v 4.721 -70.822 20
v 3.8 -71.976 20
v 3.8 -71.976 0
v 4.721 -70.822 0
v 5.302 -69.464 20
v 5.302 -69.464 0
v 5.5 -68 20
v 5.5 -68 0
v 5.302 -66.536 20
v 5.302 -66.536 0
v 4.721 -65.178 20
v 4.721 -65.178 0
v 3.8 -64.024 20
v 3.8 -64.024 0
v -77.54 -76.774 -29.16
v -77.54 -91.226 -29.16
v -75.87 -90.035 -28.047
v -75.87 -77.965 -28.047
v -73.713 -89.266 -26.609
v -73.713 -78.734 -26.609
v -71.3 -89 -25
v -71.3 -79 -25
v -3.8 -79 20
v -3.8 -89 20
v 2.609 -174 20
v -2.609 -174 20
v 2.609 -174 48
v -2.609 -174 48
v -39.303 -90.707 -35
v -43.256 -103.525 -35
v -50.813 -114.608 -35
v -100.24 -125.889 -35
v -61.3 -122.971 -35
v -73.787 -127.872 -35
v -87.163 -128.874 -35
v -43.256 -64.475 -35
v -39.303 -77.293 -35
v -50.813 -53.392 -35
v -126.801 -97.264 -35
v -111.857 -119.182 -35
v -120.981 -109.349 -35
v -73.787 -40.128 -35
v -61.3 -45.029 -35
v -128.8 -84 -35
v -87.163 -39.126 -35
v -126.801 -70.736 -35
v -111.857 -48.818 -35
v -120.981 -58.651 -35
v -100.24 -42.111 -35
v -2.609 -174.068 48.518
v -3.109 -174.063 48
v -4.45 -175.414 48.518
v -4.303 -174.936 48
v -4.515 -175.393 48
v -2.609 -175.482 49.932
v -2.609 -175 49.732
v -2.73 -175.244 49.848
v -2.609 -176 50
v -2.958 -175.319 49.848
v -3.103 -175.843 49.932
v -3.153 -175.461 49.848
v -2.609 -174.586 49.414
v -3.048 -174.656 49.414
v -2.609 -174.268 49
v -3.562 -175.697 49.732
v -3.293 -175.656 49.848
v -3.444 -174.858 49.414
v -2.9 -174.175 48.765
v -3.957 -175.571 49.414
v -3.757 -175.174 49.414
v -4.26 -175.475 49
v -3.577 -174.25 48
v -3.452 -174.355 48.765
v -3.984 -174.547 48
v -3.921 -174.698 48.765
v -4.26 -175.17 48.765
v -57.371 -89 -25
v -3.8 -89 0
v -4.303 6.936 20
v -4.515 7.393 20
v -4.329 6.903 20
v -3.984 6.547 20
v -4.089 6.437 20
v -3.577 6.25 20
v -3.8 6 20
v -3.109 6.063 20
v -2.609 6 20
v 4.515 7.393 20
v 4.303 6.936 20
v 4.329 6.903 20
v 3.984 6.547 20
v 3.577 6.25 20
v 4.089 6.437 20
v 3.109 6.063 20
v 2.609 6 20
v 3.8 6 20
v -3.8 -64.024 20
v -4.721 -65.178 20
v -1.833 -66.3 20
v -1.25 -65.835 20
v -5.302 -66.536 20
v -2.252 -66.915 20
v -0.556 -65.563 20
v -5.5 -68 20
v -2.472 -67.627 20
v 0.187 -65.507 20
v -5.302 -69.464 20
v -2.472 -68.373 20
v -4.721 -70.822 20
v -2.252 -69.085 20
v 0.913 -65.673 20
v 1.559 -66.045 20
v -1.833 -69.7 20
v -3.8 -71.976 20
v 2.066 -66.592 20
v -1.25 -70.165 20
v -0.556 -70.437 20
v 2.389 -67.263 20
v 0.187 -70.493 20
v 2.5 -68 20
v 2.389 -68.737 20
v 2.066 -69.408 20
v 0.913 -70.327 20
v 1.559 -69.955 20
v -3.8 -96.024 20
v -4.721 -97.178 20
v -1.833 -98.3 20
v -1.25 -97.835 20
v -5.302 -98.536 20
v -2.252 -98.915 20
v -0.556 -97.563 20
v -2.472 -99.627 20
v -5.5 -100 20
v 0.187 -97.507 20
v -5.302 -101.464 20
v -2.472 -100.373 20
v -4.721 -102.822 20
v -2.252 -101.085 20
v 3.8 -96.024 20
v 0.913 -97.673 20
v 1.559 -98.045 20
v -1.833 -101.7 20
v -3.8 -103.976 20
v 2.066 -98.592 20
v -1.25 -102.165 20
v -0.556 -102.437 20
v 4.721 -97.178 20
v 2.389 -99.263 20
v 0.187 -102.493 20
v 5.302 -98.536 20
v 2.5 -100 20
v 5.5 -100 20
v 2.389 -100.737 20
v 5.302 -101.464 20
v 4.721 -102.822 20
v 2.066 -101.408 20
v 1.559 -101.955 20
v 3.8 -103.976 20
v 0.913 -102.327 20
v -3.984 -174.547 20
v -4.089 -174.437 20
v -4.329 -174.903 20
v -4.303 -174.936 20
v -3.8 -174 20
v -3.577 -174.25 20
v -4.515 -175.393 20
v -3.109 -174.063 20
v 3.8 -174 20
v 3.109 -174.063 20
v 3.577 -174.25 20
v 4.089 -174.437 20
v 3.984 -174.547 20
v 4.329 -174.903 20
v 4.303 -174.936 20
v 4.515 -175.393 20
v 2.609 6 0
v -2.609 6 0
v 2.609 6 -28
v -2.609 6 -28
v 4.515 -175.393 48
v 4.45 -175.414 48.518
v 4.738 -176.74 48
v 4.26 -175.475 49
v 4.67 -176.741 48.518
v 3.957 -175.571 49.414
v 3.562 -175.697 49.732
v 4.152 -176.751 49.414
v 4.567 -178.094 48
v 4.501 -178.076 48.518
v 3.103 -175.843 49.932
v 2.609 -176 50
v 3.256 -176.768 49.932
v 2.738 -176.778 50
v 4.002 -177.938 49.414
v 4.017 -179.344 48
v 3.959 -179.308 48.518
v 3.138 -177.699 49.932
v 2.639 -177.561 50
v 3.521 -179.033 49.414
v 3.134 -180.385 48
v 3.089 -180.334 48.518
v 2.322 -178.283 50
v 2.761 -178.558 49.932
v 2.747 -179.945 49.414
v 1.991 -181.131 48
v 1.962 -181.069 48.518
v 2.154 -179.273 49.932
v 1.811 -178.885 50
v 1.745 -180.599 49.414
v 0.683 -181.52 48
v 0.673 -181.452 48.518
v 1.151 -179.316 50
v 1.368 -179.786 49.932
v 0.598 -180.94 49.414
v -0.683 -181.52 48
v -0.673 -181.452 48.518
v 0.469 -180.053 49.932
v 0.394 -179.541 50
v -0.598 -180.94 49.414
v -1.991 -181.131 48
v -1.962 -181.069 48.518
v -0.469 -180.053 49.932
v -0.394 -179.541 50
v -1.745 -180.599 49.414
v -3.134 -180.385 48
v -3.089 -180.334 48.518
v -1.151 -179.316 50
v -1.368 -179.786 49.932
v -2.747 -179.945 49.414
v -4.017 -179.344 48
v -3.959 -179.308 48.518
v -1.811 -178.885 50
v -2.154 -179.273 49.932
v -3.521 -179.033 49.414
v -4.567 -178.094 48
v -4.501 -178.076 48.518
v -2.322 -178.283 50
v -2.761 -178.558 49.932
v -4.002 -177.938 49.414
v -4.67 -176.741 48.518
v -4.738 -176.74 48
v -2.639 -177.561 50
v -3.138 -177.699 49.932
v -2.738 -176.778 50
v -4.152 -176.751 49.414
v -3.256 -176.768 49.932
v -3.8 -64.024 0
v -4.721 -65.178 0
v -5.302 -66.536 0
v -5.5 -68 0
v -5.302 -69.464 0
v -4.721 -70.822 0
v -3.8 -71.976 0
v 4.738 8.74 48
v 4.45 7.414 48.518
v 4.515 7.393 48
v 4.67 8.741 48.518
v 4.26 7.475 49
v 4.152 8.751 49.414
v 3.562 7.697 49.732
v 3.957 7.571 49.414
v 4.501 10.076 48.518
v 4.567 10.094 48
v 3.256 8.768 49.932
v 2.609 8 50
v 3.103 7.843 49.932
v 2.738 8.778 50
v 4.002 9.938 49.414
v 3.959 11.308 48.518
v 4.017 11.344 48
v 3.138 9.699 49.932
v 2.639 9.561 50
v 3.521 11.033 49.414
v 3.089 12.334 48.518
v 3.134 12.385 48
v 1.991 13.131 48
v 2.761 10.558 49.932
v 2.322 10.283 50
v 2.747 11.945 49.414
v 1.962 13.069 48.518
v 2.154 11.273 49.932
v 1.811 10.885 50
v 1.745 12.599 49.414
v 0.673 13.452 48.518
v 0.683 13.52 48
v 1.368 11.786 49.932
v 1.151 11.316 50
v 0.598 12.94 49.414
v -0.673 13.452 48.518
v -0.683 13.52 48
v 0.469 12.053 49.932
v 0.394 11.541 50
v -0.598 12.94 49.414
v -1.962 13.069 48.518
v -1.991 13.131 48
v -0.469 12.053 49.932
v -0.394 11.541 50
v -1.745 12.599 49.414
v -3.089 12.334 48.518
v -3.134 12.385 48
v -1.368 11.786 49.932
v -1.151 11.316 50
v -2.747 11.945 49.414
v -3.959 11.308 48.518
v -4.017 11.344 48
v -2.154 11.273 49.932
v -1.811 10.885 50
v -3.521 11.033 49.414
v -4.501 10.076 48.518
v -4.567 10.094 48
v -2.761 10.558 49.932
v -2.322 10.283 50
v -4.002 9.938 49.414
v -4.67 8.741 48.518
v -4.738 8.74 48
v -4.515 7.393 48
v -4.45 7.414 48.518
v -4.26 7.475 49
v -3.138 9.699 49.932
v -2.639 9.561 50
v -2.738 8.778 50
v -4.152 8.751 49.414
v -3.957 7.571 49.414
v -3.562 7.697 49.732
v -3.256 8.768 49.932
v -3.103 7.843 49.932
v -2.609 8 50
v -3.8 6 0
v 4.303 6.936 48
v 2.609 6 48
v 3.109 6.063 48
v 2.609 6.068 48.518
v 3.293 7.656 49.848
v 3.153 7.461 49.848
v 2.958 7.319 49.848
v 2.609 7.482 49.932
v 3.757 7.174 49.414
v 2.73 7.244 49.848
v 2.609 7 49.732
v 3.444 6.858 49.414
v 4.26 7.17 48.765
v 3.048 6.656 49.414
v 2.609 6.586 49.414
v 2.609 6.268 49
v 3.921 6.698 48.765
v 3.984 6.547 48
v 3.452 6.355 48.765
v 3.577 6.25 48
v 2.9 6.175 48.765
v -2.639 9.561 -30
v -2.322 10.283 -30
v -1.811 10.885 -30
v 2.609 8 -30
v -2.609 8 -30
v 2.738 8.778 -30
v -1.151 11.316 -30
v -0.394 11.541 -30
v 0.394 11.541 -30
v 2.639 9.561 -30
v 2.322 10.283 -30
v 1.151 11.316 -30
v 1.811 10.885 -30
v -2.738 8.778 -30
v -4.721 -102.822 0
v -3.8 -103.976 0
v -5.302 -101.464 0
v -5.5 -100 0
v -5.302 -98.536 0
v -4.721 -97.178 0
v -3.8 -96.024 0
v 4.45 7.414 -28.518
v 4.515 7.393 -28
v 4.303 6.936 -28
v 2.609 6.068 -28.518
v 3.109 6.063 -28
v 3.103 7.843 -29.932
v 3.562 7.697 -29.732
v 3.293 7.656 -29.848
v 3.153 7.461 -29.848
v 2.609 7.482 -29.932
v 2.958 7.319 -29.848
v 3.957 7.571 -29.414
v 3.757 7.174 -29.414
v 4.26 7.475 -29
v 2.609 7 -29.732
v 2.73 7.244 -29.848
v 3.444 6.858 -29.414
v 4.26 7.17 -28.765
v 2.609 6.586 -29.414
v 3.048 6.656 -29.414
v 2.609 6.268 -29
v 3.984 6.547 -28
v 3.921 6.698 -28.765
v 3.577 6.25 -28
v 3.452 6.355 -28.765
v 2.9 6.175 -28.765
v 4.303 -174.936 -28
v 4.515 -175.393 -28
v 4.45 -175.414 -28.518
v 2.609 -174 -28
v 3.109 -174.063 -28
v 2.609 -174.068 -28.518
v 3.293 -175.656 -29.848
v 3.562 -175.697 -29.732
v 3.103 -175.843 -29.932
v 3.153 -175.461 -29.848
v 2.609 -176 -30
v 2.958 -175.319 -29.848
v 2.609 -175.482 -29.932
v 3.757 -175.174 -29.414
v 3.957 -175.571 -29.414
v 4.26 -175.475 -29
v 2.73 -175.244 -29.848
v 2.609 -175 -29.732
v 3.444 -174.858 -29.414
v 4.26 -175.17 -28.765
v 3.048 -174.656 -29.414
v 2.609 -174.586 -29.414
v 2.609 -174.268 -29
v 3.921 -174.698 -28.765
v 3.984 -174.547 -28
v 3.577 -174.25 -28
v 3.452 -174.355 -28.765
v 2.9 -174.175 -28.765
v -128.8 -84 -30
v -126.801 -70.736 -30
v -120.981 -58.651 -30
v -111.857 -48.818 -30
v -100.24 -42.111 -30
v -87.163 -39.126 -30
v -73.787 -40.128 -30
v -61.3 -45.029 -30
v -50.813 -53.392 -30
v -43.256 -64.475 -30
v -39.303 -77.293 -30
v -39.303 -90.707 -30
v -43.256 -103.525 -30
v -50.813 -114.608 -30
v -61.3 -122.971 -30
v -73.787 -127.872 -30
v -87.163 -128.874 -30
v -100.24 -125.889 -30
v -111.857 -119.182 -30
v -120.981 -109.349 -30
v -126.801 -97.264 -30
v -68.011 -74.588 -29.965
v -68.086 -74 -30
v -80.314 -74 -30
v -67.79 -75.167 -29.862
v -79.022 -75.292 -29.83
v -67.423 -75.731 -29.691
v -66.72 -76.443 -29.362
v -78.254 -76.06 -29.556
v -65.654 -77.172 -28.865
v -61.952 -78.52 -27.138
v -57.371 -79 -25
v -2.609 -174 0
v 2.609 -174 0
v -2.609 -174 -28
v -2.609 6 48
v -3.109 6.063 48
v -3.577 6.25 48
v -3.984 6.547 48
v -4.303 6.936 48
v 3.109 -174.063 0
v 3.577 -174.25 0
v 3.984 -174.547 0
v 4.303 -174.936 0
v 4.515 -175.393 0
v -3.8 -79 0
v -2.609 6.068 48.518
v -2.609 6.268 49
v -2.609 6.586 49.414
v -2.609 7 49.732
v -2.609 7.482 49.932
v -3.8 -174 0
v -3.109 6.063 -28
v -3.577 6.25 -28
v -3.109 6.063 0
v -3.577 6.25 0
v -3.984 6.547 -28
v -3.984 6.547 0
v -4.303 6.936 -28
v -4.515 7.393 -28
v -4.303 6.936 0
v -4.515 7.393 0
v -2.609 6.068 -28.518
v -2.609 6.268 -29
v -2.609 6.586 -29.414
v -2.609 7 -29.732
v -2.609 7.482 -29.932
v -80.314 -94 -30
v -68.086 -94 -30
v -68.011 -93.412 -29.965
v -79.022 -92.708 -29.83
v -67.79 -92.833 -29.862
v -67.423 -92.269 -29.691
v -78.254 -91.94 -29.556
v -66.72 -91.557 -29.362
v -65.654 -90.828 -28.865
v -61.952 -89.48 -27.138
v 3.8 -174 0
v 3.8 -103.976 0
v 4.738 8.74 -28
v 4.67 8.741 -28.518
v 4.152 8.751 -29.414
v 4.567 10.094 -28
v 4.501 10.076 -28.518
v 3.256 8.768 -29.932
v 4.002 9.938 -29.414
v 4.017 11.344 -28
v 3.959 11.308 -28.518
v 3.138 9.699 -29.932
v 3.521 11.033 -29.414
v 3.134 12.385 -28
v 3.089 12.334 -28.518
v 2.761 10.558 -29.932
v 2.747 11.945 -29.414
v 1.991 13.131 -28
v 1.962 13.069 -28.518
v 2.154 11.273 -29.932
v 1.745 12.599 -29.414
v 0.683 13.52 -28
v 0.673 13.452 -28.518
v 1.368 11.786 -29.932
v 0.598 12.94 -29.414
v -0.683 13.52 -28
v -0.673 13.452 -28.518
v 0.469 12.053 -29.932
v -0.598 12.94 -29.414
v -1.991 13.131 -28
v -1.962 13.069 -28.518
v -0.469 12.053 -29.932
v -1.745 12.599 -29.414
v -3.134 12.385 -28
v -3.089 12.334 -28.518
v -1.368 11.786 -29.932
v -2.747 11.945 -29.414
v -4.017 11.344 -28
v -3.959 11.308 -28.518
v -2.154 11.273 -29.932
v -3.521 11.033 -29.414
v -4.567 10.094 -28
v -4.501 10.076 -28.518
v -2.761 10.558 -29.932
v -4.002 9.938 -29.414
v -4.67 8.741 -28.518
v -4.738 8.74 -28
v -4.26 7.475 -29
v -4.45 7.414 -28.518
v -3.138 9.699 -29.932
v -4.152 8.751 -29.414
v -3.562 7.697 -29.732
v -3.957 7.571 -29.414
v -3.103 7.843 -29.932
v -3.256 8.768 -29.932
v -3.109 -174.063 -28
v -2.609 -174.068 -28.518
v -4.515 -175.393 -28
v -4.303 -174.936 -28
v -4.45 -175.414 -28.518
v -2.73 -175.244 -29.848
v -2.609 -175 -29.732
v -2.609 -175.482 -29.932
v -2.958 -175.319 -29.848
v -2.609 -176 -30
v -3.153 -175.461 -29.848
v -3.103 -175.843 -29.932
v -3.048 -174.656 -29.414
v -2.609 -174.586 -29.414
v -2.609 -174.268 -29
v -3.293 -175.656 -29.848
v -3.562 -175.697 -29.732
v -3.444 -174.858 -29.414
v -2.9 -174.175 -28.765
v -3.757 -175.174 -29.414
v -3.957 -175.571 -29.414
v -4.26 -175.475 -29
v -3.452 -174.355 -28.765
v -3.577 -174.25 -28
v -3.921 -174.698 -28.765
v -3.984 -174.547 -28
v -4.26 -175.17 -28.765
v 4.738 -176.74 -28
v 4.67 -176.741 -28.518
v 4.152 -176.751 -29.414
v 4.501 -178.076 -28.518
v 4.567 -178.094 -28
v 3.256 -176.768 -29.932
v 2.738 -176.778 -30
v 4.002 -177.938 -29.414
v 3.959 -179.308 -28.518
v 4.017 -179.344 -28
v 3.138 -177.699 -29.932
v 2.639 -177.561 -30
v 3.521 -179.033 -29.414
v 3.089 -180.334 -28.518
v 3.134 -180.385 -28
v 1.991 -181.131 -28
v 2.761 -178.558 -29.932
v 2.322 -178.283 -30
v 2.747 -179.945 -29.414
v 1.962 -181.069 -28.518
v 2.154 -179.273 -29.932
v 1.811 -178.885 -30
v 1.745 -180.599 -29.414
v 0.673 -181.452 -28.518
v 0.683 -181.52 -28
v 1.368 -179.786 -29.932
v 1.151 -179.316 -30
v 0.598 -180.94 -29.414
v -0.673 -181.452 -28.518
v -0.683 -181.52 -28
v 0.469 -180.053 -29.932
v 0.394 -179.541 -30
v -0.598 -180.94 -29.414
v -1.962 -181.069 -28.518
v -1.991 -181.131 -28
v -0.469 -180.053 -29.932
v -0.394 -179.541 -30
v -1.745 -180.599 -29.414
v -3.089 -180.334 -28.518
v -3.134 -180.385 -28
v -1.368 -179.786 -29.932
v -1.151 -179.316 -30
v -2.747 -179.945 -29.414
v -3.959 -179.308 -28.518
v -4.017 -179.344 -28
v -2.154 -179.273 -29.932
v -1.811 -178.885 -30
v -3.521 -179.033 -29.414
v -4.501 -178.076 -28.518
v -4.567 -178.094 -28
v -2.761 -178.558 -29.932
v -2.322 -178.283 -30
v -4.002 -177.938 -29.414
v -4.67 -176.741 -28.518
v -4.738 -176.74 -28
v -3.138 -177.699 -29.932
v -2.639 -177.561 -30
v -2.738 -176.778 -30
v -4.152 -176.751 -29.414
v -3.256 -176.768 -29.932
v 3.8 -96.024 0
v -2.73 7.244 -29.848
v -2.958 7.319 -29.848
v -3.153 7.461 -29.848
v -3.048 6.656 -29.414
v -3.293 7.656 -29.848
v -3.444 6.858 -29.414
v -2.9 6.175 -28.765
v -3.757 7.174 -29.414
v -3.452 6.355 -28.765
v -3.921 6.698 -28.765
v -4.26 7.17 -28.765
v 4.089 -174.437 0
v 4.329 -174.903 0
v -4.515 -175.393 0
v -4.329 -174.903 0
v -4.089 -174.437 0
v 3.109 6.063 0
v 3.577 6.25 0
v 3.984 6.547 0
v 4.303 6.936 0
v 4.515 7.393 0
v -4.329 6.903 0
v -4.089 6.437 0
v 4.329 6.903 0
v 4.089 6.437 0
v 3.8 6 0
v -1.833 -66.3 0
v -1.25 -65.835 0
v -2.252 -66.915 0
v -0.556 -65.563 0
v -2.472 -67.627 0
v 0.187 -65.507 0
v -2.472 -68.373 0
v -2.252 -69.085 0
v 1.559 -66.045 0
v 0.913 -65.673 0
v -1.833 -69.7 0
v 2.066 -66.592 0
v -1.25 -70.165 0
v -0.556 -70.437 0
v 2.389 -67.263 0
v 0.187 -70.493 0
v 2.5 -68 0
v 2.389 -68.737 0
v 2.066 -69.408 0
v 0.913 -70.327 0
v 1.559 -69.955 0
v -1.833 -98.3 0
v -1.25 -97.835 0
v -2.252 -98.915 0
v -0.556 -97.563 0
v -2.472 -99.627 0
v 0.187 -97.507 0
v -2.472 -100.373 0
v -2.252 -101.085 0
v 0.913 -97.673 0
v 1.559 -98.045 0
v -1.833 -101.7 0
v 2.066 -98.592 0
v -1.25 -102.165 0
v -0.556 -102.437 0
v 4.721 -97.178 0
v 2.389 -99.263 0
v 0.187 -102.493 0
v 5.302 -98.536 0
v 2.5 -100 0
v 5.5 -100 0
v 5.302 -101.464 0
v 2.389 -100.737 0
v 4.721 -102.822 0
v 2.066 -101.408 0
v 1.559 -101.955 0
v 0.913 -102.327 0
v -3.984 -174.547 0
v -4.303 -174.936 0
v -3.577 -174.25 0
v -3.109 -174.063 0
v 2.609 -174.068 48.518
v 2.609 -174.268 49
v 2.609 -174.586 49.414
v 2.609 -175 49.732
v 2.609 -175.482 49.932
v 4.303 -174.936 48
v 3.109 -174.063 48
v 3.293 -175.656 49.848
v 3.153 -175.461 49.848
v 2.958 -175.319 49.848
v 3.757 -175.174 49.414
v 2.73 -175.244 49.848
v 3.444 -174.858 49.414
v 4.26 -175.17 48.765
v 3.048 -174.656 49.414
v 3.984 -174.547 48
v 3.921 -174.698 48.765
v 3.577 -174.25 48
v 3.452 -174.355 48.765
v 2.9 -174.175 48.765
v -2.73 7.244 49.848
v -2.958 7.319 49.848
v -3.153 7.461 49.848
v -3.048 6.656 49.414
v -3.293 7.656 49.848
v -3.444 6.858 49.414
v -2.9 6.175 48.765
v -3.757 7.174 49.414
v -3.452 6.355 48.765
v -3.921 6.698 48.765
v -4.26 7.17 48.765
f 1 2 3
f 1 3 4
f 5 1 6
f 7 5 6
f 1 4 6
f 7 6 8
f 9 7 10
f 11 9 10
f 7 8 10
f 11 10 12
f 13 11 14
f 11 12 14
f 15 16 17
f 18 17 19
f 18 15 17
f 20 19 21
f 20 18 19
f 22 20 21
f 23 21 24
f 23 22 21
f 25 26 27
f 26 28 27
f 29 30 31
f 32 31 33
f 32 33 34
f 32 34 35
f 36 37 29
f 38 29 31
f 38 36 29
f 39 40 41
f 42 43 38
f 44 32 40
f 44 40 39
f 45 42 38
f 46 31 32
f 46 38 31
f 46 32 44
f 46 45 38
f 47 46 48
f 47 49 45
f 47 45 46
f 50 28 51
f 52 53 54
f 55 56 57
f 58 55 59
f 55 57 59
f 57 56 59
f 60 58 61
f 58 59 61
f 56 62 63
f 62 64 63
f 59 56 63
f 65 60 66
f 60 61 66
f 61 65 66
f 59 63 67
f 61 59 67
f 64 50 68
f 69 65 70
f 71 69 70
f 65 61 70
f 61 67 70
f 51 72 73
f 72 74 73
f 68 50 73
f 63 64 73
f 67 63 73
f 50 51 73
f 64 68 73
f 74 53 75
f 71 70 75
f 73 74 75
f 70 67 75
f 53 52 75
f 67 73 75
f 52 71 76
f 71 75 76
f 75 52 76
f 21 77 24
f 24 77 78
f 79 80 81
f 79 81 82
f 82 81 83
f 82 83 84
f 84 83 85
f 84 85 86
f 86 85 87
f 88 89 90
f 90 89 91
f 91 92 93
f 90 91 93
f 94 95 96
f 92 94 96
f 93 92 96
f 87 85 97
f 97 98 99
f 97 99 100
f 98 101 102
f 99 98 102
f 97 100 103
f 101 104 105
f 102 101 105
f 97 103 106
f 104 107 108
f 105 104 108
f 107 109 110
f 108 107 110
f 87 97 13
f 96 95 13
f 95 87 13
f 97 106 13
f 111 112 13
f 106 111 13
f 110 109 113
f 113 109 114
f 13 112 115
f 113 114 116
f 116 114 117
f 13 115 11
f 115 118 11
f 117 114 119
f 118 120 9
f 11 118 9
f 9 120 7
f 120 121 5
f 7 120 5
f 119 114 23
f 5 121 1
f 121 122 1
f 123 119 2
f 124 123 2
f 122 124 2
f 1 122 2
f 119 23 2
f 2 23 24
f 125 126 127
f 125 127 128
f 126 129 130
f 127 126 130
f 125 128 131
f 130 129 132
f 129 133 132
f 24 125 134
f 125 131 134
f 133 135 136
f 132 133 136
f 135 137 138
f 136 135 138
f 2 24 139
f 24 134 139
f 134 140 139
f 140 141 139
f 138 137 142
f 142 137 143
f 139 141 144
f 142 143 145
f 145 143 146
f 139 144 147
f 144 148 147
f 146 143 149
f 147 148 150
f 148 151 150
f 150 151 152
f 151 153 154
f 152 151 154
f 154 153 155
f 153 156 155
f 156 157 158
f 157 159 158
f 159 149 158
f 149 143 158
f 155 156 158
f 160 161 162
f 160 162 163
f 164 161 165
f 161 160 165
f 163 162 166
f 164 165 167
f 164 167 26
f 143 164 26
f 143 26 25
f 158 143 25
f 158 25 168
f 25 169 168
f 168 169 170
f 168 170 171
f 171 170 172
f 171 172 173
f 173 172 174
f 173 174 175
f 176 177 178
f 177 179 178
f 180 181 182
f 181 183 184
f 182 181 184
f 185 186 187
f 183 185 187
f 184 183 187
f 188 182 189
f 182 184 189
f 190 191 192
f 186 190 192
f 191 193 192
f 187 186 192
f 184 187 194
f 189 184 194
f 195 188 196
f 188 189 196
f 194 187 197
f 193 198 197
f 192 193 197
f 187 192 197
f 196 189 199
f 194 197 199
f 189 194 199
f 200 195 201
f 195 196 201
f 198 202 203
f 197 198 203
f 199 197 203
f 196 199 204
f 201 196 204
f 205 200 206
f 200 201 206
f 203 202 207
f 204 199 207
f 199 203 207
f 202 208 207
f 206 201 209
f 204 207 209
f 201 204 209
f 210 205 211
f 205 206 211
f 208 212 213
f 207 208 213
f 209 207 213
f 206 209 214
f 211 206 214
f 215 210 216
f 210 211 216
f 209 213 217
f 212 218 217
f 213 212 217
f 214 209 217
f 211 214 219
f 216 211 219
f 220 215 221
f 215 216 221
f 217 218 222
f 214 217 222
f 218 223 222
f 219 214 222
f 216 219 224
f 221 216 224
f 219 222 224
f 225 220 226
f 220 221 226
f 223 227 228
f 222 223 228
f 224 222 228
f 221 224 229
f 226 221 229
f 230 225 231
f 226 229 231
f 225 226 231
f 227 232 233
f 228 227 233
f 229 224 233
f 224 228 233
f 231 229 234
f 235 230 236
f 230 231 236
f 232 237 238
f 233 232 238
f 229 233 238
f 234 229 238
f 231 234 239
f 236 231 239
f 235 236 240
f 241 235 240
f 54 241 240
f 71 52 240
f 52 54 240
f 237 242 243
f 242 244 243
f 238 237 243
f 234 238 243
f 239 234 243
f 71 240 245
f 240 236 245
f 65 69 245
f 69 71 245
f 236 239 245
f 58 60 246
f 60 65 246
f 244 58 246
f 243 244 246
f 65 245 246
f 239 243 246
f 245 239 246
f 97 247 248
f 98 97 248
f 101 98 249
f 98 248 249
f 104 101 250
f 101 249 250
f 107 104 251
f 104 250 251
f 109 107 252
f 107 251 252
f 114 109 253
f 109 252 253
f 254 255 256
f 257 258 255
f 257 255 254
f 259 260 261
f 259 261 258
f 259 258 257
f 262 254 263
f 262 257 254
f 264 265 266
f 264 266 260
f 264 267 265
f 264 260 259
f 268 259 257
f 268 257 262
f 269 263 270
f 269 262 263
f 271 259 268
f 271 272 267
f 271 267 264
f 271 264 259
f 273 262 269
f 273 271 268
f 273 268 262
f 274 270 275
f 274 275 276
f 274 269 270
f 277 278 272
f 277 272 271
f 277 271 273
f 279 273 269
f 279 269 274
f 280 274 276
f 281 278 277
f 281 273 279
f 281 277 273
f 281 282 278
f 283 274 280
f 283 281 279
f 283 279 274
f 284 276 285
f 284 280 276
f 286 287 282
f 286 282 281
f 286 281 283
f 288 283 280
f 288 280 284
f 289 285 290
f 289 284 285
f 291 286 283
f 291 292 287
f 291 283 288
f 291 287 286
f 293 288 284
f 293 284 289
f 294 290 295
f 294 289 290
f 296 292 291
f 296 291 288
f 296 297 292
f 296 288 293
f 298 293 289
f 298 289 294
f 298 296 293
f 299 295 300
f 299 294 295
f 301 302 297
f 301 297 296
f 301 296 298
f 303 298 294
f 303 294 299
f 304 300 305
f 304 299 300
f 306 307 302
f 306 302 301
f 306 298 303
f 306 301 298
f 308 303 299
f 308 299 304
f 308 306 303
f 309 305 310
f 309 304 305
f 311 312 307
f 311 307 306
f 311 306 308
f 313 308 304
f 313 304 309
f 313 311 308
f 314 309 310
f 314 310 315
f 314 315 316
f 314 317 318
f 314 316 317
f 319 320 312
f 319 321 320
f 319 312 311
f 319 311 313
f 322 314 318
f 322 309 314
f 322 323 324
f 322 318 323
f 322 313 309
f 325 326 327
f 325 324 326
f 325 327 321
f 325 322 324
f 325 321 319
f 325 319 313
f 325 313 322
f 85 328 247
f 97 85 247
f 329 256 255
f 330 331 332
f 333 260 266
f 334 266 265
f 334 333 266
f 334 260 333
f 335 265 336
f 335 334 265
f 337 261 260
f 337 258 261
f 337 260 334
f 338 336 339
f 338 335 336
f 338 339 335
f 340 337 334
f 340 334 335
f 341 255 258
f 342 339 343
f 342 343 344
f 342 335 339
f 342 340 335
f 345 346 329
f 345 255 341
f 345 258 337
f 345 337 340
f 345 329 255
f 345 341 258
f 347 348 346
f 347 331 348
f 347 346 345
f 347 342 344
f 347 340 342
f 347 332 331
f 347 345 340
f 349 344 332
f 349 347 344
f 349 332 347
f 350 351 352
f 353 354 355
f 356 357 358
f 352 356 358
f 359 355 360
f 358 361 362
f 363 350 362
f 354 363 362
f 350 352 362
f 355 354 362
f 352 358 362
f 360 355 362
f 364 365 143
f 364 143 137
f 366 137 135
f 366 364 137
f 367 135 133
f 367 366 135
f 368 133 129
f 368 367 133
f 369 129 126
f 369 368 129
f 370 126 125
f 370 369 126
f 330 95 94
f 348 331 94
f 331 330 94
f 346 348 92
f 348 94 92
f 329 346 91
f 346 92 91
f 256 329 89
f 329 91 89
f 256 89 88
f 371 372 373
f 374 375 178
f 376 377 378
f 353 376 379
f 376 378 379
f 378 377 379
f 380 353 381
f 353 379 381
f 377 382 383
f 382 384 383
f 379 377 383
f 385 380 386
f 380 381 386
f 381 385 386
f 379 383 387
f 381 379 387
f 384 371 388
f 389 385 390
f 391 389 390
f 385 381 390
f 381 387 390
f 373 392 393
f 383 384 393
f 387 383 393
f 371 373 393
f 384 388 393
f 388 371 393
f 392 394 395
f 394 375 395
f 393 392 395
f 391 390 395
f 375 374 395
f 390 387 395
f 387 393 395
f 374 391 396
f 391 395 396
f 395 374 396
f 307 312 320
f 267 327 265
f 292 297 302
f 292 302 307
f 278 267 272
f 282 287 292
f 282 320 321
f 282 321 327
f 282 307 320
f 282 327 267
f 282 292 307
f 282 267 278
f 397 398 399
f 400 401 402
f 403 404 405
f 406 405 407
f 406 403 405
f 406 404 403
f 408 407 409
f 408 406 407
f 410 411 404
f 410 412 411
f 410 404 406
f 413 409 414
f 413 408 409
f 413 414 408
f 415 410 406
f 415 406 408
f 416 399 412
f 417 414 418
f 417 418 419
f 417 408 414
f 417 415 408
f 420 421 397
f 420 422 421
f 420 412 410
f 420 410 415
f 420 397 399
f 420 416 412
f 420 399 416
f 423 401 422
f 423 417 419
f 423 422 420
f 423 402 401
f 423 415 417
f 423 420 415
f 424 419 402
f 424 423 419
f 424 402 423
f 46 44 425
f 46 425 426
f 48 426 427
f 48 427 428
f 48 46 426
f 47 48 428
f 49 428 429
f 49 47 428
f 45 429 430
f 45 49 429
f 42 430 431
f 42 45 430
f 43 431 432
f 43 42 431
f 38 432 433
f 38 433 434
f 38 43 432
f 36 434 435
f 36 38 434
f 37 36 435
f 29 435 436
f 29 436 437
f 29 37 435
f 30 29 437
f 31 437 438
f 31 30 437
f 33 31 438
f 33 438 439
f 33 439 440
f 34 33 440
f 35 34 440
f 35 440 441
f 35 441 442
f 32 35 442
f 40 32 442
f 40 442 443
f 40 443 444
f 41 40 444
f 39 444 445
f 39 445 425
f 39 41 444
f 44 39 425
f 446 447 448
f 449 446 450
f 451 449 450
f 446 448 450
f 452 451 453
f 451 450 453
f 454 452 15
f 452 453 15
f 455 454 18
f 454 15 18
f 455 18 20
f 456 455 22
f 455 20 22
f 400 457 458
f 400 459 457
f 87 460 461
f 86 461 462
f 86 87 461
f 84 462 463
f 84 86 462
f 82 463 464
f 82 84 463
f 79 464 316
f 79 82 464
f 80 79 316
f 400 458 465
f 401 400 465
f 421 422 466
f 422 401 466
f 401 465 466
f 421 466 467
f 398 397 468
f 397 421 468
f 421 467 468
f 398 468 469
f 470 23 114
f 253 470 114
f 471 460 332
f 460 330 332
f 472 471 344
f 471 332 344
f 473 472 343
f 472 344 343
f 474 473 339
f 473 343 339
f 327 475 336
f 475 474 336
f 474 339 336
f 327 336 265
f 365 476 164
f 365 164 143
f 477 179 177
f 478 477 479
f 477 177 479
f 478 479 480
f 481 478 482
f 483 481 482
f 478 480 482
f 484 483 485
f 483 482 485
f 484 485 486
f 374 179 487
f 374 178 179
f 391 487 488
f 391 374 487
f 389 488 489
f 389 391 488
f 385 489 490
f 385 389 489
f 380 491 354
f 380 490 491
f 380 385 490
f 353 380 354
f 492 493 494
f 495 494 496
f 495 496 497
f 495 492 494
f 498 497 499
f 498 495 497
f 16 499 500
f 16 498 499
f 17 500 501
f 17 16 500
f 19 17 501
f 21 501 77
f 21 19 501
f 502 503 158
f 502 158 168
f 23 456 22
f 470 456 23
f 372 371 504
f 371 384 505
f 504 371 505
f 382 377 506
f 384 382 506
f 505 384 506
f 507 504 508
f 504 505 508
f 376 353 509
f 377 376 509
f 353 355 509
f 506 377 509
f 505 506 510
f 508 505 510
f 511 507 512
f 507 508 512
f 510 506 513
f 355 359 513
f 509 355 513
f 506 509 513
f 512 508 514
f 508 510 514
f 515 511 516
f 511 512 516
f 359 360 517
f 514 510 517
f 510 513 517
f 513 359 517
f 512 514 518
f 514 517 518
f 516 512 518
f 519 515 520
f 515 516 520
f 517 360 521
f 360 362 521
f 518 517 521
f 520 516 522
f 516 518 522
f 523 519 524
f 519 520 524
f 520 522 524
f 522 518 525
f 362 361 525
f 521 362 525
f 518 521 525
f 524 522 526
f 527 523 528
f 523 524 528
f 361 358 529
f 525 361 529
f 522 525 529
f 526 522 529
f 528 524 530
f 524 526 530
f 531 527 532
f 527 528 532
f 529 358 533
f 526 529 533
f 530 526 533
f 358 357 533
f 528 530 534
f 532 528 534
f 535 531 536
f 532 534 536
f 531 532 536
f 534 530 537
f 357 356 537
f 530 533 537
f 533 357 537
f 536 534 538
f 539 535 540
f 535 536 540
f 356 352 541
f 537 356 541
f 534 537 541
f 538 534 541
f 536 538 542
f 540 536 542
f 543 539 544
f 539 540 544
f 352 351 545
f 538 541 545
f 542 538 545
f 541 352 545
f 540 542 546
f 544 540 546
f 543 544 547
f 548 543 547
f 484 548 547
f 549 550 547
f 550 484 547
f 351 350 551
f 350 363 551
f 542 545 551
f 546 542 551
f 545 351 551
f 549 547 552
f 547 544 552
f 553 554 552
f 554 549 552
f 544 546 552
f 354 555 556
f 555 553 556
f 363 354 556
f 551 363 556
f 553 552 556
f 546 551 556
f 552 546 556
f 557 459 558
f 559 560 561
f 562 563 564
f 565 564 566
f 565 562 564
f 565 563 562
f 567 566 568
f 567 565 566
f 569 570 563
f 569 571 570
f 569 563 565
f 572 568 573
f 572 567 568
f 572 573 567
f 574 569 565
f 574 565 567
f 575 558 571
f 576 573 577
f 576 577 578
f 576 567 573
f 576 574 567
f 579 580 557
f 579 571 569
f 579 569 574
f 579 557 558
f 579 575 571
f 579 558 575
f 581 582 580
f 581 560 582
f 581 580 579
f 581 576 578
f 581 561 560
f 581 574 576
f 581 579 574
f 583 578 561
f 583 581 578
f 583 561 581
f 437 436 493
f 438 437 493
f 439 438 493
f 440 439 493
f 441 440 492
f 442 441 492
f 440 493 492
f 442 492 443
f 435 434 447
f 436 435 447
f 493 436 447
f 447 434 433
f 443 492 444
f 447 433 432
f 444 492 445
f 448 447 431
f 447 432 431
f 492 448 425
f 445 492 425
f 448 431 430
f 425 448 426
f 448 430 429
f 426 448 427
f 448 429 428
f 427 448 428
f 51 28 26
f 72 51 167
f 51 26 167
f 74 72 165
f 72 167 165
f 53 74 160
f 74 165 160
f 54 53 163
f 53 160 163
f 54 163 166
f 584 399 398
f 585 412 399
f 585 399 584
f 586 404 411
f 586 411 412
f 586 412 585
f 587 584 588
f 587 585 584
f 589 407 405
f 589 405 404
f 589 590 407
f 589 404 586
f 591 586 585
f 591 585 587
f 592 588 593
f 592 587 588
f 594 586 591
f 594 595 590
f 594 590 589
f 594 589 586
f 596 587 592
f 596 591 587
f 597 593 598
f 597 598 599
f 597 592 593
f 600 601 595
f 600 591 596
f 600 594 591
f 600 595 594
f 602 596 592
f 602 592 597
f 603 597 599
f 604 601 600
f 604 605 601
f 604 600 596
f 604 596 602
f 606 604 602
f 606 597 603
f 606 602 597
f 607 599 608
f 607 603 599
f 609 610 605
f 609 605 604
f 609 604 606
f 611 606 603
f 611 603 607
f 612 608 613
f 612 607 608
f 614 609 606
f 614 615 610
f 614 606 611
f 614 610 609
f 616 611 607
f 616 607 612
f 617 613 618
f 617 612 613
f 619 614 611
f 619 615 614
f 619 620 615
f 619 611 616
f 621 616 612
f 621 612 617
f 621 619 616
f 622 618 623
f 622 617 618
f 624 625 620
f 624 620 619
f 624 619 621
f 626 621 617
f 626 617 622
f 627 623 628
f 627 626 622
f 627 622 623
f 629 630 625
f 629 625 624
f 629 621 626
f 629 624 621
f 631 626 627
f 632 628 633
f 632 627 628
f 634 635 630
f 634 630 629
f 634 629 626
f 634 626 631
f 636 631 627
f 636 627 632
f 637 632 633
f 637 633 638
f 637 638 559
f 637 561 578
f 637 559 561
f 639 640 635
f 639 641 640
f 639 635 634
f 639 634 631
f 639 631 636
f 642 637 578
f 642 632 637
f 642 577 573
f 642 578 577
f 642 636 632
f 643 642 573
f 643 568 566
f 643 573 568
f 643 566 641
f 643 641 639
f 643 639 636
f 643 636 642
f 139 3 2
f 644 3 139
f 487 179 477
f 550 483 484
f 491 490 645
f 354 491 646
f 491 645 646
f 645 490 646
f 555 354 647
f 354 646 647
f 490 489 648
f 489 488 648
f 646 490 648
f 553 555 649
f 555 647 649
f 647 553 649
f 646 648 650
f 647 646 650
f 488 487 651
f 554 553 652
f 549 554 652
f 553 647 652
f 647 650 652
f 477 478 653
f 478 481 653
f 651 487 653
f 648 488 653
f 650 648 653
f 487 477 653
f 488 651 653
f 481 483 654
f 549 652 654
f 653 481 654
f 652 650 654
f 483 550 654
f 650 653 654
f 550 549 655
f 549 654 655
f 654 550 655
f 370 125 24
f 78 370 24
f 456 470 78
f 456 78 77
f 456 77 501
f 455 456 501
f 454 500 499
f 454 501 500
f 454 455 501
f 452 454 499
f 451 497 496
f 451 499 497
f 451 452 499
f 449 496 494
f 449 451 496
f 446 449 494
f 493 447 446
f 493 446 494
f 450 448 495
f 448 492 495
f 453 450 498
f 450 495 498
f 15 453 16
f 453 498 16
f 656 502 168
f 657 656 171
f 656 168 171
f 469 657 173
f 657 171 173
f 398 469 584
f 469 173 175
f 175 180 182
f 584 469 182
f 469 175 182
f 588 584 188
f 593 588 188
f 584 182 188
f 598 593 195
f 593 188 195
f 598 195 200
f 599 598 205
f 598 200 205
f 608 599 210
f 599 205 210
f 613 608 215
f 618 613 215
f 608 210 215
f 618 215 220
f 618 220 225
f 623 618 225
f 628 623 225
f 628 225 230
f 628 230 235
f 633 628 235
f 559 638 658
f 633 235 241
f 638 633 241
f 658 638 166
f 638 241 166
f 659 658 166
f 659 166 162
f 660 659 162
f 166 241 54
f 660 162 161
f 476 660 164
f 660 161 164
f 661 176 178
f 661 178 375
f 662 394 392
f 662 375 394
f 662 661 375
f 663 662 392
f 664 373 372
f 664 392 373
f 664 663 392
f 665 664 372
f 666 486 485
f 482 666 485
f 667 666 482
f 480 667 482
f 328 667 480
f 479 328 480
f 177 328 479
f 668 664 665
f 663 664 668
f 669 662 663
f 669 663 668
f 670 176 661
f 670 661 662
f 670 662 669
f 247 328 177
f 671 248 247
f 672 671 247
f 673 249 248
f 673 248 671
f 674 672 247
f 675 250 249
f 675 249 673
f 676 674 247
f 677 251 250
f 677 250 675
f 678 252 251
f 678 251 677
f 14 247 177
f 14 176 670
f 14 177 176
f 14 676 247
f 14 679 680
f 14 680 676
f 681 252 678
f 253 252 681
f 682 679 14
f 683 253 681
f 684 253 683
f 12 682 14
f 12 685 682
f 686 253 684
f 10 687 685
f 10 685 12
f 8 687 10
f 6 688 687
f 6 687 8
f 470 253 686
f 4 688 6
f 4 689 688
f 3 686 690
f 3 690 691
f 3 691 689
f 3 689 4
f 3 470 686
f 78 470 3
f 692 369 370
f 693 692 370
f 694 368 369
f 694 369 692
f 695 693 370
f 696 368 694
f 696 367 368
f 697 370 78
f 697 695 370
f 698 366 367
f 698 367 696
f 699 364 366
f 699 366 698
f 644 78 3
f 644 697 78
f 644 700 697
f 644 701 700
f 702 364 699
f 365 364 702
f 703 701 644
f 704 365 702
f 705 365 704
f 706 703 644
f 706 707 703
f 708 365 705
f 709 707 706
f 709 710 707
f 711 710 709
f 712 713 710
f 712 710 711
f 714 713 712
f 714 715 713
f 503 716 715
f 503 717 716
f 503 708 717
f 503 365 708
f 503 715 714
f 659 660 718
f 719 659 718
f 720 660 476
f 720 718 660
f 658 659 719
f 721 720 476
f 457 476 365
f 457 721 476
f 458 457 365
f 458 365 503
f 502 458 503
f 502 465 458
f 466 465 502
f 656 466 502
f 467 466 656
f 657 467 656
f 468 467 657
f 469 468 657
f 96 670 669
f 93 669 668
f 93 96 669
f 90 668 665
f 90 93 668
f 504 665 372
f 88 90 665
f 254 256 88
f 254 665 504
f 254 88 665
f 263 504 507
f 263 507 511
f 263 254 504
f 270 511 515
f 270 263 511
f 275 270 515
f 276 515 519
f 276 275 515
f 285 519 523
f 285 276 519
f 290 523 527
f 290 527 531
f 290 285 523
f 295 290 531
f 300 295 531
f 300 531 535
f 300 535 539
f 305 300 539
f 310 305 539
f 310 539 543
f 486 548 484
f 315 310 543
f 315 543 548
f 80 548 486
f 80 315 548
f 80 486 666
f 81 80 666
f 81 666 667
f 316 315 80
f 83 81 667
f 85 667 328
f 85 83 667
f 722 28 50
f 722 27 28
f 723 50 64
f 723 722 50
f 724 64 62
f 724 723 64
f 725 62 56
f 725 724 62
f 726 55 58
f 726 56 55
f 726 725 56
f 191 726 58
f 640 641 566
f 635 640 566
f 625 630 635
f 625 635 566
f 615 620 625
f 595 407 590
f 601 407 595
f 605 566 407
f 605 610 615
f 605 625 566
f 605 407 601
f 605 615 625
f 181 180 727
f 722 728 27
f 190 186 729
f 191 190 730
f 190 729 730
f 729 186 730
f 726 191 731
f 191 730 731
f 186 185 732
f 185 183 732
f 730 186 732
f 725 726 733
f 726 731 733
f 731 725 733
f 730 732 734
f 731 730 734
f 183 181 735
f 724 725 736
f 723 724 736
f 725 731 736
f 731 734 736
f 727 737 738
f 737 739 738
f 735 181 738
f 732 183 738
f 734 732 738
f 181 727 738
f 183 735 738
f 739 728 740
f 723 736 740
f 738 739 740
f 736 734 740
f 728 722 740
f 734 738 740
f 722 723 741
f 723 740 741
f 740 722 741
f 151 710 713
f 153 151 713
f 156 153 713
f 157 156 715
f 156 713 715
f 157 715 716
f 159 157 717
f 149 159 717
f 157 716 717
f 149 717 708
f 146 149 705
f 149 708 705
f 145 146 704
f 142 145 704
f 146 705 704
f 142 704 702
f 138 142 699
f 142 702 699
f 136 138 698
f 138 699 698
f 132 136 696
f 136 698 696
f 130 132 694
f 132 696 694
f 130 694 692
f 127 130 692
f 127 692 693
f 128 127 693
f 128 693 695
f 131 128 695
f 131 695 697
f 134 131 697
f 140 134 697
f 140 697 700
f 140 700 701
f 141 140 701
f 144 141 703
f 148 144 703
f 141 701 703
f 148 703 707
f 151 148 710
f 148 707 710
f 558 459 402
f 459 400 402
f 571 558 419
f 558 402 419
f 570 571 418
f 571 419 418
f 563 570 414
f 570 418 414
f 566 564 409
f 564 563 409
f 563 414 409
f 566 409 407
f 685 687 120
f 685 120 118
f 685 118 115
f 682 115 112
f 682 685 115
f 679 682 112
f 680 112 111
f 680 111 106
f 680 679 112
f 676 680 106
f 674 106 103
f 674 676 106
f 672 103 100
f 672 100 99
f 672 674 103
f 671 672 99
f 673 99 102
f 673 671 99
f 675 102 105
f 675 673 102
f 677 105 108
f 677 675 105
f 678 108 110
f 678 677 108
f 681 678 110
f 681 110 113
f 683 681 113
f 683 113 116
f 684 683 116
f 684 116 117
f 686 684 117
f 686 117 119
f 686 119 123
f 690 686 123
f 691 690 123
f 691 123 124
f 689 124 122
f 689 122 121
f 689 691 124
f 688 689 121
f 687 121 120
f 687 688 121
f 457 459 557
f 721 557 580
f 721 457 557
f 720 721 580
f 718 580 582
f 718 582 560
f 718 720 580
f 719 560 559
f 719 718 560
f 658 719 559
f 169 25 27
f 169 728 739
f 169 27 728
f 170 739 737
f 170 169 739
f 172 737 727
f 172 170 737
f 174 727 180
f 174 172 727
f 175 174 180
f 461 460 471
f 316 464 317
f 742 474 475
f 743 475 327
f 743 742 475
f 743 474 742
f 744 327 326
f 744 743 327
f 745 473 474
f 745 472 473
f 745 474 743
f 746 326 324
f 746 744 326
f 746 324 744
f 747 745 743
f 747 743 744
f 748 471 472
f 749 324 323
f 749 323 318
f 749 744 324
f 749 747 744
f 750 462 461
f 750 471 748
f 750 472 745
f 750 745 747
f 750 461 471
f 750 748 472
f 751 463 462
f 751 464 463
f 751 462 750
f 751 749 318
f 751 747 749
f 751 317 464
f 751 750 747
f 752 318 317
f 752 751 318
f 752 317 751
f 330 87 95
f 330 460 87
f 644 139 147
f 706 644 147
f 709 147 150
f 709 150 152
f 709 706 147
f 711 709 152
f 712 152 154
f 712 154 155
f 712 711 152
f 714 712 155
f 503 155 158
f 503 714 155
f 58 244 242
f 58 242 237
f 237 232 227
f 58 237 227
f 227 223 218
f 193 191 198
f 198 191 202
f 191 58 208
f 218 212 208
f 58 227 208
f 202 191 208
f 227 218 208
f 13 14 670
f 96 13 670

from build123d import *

# Parameters (mm, degrees)
SKETCH1_R                = 2.5000000000000036
BOSS_EXTRUDE1_DEPTH      = 20
BOSS_EXTRUDE3_START      = -30
BOSS_EXTRUDE3_DEPTH      = 30
FILLET1_R                = 2
FILLET1_OF_MIRROR2_R     = 2
BOSS_EXTRUDE5_DEPTH      = 5
BOSS_EXTRUDE5_DEPTH_BACK = 5
SKETCH10_W               = 5
SKETCH10_H               = 4.9999999999999964
SKETCH11_R               = 44.99999999999999
BOSS_EXTRUDE6_DEPTH      = 5
FILLET2_R                = 5


# Read off the part's stored shape, not the designer's step: Mirror3
with BuildPart() as part:
    # Sketch1 → Boss-Extrude1 (new body)
    with BuildSketch(Plane.XY):
        with BuildLine():
            Line((-3.7999999999999994, 5.999999999999999), (-3.799999999999992, -64.0238209295858))
            ThreePointArc((-3.800000000000015, -64.0238209295858), (-5.499999999999996, -67.99999999999999), (-3.8000000000000083, -71.97617907041419))
            Line((-3.799999999999991, -71.97617907041419), (-3.7999999999999896, -83.99999999999999))
            Line((-3.799999999999989, -83.99999999999999), (3.800000000000014, -83.99999999999999))
            Line((3.800000000000014, -83.99999999999999), (3.8000000000000123, -71.97617907041419))
            ThreePointArc((3.8000000000000083, -71.97617907041419), (5.499999999999996, -67.99999999999999), (3.800000000000015, -64.0238209295858))
            Line((3.800000000000011, -64.0238209295858), (3.7999999999999994, 6))
            ThreePointArc((3.800000000000001, 5.999999999999998), (0, 13.569343394379079), (-3.8000000000000016, 5.999999999999998))
        make_face()
        with Locations((0, -67.99999999999999)):
            Circle(SKETCH1_R, mode=Mode.SUBTRACT)
    extrude(amount=BOSS_EXTRUDE1_DEPTH)

    # Sketch5 → Boss-Extrude3 (add)
    with BuildSketch(Plane.XY.offset(BOSS_EXTRUDE3_START)):
        with BuildLine():
            ThreePointArc((4.738519293185978, 8.8308241011931), (-1.4911726556286193, 13.328597906421773), (-3.800000000000001, 5.999999999999998))
            Line((-3.8000000000000007, 5.999999999999998), (3.8000000000000007, 5.999999999999998))
            ThreePointArc((3.800000000000001, 5.999999999999999), (4.497773805228675, 7.339651445564482), (4.738519293185978, 8.830824101193098))
        make_face()
    boss_extrude3 = extrude(amount=BOSS_EXTRUDE3_DEPTH)

    # Fillet1
    fillet1_edges = [part.edges().sort_by_distance(p)[0] for p in [
        (0, 5.999999999999998, -30),
        (3.800000000000001, 5.999999999999998, -15),
        (4.44e-15, 13.569343394379077, -30),
        (-3.8000000000000016, 5.999999999999998, -15),
    ]]
    fillet(fillet1_edges, radius=FILLET1_R)

    # Mirror2: Boss-Extrude3 across plane
    add(boss_extrude3.mirror(Plane(origin=(0, 0, 10), x_dir=(1, 0, 0), z_dir=(0, 0, -1))))

    # Fillet1 of Mirror2
    fillet1_of_mirror2_edges = [part.edges().sort_by_distance(p)[0] for p in [
        (0, 5.999999999999998, 50),
        (3.800000000000001, 5.999999999999998, 35),
        (4.44e-15, 13.569343394379077, 50),
        (-3.8000000000000016, 5.999999999999998, 35),
    ]]
    fillet(fillet1_of_mirror2_edges, radius=FILLET1_OF_MIRROR2_R)

    # Mirror3: part across plane


with BuildPart() as part_1:
    add(part.part)
    add(part.part.mirror(Plane(origin=(0, -83.99999999999999, 20), x_dir=(0, 0, 1), z_dir=(0, -1, 0))))

    # Sketch10 → Boss-Extrude5 (add, two sides: drawn at the far end of the back side and taken through both)
    with BuildSketch(Plane(origin=(0, -83.99999999999999, 0), x_dir=(-1, 0, 0), z_dir=(0, -1, 0)).offset(-BOSS_EXTRUDE5_DEPTH_BACK)):
        Polygon((3.799999999999991, -20), (3.8000000000000007, 0), (78.79999999999998, 35.00000000000001), (78.79999999999998, 30.00000000000001), align=None)
        with Locations((81.29999999999998, 32.50000000000001)):
            Rectangle(SKETCH10_W, SKETCH10_H)
    extrude(amount=BOSS_EXTRUDE5_DEPTH + BOSS_EXTRUDE5_DEPTH_BACK)

    # Sketch11 → Boss-Extrude6 (add)
    with BuildSketch(Plane(origin=(0, 0, -35.00000000000001), x_dir=(-1, 0, 0), z_dir=(0, 0, -1))):
        with Locations((83.79999999999998, -83.99999999999999)):
            Circle(SKETCH11_R)
    extrude(amount=-BOSS_EXTRUDE6_DEPTH)

    # Fillet2
    fillet2_edges = [part_1.edges().sort_by_distance(p)[0] for p in [
        (-78.79999999999998, -83.99999999999999, -30.00000000000001),
        (-73.44285714285712, -88.99999999999999, -30.000000000000007),
        (-73.44285714285712, -78.99999999999999, -30.000000000000007),
    ]]
    fillet(fillet2_edges, radius=FILLET2_R)


solid = part_1.part
